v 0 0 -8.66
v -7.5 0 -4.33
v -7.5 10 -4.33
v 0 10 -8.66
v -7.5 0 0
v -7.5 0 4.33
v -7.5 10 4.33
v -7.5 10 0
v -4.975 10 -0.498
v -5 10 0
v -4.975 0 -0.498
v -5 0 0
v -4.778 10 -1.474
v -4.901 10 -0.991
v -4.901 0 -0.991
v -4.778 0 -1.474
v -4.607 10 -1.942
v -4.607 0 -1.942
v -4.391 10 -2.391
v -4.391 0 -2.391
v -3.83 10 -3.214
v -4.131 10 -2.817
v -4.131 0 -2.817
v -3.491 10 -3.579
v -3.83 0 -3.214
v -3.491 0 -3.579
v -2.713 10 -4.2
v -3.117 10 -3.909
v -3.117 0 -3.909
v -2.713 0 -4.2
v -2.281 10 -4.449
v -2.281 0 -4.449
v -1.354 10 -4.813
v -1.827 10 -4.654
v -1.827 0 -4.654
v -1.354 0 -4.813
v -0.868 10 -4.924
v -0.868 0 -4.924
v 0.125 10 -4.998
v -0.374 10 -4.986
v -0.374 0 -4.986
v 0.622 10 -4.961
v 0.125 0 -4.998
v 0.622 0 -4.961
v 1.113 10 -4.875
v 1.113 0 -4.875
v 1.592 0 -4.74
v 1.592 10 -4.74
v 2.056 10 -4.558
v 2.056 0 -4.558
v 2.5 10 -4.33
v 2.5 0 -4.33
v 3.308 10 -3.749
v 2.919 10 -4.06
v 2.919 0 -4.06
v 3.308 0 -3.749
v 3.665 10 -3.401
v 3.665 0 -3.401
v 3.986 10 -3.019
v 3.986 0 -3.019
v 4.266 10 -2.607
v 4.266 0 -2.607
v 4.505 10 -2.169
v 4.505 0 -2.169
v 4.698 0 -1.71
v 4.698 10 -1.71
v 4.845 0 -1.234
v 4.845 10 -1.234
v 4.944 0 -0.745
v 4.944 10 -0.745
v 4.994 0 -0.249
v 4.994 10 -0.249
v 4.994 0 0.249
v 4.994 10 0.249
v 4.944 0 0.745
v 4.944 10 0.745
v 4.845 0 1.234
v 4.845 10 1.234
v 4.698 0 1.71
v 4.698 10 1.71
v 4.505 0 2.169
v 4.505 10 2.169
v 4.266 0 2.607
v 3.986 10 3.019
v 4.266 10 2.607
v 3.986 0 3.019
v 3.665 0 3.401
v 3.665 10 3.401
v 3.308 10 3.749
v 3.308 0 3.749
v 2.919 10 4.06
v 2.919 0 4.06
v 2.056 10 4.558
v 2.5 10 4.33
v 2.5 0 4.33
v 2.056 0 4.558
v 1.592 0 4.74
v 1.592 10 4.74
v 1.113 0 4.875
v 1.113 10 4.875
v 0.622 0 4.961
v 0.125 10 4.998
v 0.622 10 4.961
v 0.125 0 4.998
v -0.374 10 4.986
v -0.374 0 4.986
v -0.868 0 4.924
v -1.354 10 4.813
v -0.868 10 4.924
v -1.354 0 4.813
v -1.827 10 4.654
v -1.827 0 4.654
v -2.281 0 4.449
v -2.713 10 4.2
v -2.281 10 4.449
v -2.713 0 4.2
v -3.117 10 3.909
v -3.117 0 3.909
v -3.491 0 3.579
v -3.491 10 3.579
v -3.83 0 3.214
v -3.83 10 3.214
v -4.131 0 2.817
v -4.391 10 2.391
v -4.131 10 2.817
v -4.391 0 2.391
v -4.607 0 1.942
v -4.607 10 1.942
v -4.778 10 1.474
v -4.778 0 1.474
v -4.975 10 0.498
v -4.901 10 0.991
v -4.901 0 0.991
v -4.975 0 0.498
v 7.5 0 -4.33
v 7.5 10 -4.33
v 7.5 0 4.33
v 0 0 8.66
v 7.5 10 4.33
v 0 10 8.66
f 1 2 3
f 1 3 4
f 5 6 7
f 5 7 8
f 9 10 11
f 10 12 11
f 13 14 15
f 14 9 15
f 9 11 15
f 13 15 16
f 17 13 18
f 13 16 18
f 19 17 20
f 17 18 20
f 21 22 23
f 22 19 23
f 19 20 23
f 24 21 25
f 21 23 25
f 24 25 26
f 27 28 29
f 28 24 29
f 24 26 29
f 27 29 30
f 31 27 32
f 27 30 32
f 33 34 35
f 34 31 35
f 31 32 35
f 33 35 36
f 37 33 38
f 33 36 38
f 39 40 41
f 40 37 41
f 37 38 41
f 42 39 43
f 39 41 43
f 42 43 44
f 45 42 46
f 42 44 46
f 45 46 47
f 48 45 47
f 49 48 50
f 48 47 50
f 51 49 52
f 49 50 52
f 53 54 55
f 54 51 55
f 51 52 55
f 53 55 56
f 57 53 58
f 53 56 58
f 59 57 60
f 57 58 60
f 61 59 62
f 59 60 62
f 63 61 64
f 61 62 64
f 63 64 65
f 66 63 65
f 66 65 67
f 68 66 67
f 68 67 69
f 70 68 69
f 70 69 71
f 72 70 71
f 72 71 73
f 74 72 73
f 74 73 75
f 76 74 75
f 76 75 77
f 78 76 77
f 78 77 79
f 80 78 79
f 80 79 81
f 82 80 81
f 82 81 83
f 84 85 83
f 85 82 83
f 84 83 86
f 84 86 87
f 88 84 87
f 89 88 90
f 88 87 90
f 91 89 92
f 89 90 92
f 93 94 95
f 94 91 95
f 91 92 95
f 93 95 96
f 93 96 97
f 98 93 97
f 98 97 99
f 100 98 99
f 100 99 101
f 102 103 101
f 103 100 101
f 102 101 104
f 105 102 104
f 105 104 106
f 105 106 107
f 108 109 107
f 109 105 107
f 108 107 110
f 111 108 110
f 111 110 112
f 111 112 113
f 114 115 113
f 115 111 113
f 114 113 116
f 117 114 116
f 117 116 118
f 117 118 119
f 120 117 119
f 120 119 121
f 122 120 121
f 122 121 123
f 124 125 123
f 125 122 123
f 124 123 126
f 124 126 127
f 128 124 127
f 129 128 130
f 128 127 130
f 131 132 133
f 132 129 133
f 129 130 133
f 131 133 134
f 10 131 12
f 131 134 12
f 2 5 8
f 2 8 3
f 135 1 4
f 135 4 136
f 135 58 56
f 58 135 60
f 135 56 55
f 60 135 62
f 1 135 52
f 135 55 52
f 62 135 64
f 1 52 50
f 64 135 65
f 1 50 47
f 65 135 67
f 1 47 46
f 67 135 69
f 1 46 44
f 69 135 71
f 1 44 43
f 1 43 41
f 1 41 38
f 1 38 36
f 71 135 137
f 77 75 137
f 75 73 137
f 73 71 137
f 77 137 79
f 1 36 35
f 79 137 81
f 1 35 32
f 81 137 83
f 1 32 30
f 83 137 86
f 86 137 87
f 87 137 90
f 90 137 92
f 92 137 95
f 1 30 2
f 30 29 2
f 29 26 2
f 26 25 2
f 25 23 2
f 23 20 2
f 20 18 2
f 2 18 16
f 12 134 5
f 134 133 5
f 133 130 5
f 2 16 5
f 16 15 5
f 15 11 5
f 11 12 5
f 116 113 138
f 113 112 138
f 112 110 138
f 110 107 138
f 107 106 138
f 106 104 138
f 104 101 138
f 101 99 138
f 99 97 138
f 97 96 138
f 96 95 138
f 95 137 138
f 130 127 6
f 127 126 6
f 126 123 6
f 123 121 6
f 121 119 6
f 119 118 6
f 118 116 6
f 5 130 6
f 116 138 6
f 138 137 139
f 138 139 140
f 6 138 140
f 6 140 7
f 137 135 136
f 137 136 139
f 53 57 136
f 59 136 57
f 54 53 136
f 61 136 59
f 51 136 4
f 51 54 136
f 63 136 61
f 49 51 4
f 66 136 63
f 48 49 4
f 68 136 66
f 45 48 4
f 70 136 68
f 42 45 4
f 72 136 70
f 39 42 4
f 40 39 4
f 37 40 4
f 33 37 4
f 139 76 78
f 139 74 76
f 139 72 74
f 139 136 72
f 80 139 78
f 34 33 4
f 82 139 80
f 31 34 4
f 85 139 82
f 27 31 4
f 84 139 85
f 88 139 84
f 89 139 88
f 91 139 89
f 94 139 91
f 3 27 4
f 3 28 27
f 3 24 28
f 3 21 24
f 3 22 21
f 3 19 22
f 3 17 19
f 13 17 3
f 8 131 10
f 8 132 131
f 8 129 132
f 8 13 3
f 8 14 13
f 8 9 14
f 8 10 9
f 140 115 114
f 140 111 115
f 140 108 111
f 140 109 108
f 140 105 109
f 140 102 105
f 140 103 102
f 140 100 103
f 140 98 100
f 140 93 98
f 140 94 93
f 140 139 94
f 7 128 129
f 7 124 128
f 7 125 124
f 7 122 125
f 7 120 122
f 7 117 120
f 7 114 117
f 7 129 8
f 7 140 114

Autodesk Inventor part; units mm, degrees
ref_plane "YZ Plane" through (0, 0, 0) normal (1, 0, 0) x (0, 1, 0)
ref_plane "XZ Plane" through (0, 0, 0) normal (0, 1, 0) x (-1, 0, 0)
ref_plane "XY Plane" through (0, 0, 0) normal (0, 0, 1) x (1, 0, 0)
sketch "Szkic1" plane through (0, 0, 0) normal (0, 1, 0) x (-1, 0, 0)
  circle A0 centre (0, 0) radius 5
  line L0 (7.5, 0) -> (5, 0)
  line L1 (7.5, -4.3301) -> (0, -8.6603)
  line L2 (0, -8.6603) -> (-7.5, -4.3301)
  line L3 (-7.5, -4.3301) -> (-7.5, 4.3301)
  line L4 (-7.5, 4.3301) -> (0, 8.6603)
  line L5 (0, 8.6603) -> (7.5, 4.3301)
  line L6 (7.5, 4.3301) -> (7.5, -4.3301)
extrude "Wyciągnięcie proste1" add sketch "Szkic1" along normal blind 10
thread "Gwint1" size "TR10x2" class "7H" standard "ISO Metric Trapezoidal Threads" full length
properties part number "Nakrętka trapezowa 10x17"
